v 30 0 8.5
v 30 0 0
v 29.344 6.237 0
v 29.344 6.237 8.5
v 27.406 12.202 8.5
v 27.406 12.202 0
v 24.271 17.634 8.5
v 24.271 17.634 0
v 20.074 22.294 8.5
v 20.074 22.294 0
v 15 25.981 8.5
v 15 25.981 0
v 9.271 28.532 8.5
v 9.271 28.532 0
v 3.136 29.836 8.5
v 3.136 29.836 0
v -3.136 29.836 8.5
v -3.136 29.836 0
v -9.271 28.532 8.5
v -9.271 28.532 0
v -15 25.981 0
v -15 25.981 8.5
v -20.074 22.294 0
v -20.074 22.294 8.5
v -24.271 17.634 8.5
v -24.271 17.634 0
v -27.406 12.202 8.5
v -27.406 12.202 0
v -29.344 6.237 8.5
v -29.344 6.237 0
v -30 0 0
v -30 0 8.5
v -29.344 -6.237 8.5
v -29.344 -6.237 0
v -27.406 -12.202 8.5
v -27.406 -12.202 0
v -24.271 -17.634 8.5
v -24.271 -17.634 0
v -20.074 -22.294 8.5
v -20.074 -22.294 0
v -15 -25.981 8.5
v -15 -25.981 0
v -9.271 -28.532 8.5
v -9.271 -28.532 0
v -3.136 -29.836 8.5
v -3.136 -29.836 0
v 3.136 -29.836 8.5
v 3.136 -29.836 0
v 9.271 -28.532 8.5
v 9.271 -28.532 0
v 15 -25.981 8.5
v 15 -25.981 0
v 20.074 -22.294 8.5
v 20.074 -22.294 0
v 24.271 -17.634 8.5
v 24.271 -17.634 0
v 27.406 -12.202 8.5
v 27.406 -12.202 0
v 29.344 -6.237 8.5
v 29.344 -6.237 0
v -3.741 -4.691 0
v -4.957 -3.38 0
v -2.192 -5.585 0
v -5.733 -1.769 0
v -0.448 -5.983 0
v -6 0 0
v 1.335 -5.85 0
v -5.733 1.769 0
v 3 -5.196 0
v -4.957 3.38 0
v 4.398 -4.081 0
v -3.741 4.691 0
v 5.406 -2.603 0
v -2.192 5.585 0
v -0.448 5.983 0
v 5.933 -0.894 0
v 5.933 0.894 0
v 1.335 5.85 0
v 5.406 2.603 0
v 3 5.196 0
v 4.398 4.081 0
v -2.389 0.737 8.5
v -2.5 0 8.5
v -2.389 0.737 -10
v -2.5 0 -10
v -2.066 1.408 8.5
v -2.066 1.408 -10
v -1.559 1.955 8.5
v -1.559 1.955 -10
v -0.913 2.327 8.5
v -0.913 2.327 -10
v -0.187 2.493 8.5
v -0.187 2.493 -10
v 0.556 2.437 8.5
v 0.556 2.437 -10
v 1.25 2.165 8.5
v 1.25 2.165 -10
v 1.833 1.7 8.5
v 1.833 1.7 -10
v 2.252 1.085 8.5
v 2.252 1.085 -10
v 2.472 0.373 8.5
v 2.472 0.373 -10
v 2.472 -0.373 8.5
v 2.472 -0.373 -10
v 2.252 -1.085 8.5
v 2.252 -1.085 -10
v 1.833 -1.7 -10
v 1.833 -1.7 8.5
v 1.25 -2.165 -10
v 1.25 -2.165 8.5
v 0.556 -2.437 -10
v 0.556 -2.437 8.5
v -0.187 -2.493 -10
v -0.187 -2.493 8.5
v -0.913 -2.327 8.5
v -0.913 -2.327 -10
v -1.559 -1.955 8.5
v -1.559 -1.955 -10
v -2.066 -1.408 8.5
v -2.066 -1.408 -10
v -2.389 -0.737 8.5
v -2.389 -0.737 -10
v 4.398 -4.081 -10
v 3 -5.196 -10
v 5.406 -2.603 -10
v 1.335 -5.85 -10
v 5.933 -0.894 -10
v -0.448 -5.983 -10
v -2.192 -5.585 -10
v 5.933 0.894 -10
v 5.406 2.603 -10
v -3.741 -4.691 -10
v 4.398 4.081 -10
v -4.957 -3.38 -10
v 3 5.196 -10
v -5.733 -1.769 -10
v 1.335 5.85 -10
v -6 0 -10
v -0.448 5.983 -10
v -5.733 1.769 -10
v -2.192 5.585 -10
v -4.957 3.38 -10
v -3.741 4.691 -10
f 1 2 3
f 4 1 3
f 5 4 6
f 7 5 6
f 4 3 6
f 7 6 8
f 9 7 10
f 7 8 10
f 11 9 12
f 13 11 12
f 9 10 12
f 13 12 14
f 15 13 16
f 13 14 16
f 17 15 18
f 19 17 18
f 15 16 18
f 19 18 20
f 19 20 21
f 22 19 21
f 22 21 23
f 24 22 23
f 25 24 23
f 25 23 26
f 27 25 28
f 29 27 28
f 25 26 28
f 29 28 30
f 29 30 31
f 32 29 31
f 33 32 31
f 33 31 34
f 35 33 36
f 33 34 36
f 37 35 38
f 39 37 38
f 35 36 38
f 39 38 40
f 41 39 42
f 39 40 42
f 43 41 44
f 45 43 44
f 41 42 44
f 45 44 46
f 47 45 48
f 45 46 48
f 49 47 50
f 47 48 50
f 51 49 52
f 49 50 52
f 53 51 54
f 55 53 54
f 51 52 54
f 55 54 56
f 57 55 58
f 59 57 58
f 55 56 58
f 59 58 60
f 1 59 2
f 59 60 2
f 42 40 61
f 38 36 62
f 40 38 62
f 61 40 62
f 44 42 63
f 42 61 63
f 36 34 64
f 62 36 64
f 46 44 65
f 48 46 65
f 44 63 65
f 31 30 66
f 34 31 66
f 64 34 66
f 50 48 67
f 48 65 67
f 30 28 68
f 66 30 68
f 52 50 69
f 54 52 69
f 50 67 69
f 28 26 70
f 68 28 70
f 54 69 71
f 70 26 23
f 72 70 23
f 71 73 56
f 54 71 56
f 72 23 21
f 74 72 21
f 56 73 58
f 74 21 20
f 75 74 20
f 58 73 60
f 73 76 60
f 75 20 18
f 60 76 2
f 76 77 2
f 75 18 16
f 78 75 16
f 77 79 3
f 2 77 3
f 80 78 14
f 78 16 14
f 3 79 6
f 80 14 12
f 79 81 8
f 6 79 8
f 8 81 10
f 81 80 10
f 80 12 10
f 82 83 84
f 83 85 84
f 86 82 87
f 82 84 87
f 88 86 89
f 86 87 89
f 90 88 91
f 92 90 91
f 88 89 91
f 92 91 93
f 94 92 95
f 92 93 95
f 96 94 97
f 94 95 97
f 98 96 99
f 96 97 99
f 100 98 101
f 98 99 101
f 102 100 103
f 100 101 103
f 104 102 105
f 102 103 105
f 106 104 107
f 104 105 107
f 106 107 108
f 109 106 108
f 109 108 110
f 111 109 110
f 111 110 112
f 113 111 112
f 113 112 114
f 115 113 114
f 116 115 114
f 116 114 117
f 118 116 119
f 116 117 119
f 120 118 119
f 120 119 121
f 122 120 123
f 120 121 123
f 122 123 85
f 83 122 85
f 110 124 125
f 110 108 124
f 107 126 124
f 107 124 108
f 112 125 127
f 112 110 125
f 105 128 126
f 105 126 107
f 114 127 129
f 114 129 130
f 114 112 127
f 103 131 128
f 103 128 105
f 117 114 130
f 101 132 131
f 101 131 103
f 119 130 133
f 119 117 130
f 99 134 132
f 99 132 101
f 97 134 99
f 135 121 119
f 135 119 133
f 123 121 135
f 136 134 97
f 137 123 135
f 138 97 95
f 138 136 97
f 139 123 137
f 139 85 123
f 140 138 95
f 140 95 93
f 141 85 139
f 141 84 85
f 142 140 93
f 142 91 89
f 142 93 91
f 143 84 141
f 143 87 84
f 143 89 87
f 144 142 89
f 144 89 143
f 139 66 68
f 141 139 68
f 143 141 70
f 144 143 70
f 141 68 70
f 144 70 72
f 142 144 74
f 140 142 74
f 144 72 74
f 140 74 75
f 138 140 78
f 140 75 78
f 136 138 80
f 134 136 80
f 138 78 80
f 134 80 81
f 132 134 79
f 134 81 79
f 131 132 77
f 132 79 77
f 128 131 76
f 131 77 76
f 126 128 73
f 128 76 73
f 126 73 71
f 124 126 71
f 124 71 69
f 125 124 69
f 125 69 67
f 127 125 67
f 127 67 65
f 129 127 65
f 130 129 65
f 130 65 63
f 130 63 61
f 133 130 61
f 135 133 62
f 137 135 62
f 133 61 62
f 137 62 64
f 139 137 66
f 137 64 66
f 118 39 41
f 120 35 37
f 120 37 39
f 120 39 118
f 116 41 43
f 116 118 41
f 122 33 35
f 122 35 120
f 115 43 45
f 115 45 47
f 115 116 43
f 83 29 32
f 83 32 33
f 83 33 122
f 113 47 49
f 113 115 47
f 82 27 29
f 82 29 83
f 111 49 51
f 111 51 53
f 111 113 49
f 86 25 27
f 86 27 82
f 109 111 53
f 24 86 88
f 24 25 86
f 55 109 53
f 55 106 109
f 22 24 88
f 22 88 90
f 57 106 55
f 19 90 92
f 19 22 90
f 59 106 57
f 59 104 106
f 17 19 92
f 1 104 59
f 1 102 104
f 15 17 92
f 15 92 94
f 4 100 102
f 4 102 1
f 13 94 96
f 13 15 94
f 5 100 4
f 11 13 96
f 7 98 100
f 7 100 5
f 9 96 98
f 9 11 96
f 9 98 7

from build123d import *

# Parameters (mm, degrees)
SKETCH1_R           = 30
BOSS_EXTRUDE1_DEPTH = 8.5
SKETCH2_R           = 6
SKETCH2_R_2         = 2.5
BOSS_EXTRUDE2_DEPTH = 10
SKETCH3_R           = 2.5
CUT_EXTRUDE1_DEPTH  = 19.5


with BuildPart() as part:
    # Sketch1 → Boss-Extrude1 (new body)
    with BuildSketch(Plane.XY):
        Circle(SKETCH1_R)
    extrude(amount=BOSS_EXTRUDE1_DEPTH)

    # Sketch2 → Boss-Extrude2 (add)
    with BuildSketch(Plane(origin=(0, 0, 0), x_dir=(-1, 0, 0), z_dir=(0, 0, -1))):
        Circle(SKETCH2_R)
        Circle(SKETCH2_R_2, mode=Mode.SUBTRACT)
    extrude(amount=BOSS_EXTRUDE2_DEPTH)

    # Sketch3 → Cut-Extrude1 (cut, through all)
    with BuildSketch(Plane(origin=(0, 0, -10), x_dir=(-1, 0, 0), z_dir=(0, 0, -1))):
        Circle(SKETCH3_R)
    extrude(amount=-CUT_EXTRUDE1_DEPTH, mode=Mode.SUBTRACT)


solid = part.part
